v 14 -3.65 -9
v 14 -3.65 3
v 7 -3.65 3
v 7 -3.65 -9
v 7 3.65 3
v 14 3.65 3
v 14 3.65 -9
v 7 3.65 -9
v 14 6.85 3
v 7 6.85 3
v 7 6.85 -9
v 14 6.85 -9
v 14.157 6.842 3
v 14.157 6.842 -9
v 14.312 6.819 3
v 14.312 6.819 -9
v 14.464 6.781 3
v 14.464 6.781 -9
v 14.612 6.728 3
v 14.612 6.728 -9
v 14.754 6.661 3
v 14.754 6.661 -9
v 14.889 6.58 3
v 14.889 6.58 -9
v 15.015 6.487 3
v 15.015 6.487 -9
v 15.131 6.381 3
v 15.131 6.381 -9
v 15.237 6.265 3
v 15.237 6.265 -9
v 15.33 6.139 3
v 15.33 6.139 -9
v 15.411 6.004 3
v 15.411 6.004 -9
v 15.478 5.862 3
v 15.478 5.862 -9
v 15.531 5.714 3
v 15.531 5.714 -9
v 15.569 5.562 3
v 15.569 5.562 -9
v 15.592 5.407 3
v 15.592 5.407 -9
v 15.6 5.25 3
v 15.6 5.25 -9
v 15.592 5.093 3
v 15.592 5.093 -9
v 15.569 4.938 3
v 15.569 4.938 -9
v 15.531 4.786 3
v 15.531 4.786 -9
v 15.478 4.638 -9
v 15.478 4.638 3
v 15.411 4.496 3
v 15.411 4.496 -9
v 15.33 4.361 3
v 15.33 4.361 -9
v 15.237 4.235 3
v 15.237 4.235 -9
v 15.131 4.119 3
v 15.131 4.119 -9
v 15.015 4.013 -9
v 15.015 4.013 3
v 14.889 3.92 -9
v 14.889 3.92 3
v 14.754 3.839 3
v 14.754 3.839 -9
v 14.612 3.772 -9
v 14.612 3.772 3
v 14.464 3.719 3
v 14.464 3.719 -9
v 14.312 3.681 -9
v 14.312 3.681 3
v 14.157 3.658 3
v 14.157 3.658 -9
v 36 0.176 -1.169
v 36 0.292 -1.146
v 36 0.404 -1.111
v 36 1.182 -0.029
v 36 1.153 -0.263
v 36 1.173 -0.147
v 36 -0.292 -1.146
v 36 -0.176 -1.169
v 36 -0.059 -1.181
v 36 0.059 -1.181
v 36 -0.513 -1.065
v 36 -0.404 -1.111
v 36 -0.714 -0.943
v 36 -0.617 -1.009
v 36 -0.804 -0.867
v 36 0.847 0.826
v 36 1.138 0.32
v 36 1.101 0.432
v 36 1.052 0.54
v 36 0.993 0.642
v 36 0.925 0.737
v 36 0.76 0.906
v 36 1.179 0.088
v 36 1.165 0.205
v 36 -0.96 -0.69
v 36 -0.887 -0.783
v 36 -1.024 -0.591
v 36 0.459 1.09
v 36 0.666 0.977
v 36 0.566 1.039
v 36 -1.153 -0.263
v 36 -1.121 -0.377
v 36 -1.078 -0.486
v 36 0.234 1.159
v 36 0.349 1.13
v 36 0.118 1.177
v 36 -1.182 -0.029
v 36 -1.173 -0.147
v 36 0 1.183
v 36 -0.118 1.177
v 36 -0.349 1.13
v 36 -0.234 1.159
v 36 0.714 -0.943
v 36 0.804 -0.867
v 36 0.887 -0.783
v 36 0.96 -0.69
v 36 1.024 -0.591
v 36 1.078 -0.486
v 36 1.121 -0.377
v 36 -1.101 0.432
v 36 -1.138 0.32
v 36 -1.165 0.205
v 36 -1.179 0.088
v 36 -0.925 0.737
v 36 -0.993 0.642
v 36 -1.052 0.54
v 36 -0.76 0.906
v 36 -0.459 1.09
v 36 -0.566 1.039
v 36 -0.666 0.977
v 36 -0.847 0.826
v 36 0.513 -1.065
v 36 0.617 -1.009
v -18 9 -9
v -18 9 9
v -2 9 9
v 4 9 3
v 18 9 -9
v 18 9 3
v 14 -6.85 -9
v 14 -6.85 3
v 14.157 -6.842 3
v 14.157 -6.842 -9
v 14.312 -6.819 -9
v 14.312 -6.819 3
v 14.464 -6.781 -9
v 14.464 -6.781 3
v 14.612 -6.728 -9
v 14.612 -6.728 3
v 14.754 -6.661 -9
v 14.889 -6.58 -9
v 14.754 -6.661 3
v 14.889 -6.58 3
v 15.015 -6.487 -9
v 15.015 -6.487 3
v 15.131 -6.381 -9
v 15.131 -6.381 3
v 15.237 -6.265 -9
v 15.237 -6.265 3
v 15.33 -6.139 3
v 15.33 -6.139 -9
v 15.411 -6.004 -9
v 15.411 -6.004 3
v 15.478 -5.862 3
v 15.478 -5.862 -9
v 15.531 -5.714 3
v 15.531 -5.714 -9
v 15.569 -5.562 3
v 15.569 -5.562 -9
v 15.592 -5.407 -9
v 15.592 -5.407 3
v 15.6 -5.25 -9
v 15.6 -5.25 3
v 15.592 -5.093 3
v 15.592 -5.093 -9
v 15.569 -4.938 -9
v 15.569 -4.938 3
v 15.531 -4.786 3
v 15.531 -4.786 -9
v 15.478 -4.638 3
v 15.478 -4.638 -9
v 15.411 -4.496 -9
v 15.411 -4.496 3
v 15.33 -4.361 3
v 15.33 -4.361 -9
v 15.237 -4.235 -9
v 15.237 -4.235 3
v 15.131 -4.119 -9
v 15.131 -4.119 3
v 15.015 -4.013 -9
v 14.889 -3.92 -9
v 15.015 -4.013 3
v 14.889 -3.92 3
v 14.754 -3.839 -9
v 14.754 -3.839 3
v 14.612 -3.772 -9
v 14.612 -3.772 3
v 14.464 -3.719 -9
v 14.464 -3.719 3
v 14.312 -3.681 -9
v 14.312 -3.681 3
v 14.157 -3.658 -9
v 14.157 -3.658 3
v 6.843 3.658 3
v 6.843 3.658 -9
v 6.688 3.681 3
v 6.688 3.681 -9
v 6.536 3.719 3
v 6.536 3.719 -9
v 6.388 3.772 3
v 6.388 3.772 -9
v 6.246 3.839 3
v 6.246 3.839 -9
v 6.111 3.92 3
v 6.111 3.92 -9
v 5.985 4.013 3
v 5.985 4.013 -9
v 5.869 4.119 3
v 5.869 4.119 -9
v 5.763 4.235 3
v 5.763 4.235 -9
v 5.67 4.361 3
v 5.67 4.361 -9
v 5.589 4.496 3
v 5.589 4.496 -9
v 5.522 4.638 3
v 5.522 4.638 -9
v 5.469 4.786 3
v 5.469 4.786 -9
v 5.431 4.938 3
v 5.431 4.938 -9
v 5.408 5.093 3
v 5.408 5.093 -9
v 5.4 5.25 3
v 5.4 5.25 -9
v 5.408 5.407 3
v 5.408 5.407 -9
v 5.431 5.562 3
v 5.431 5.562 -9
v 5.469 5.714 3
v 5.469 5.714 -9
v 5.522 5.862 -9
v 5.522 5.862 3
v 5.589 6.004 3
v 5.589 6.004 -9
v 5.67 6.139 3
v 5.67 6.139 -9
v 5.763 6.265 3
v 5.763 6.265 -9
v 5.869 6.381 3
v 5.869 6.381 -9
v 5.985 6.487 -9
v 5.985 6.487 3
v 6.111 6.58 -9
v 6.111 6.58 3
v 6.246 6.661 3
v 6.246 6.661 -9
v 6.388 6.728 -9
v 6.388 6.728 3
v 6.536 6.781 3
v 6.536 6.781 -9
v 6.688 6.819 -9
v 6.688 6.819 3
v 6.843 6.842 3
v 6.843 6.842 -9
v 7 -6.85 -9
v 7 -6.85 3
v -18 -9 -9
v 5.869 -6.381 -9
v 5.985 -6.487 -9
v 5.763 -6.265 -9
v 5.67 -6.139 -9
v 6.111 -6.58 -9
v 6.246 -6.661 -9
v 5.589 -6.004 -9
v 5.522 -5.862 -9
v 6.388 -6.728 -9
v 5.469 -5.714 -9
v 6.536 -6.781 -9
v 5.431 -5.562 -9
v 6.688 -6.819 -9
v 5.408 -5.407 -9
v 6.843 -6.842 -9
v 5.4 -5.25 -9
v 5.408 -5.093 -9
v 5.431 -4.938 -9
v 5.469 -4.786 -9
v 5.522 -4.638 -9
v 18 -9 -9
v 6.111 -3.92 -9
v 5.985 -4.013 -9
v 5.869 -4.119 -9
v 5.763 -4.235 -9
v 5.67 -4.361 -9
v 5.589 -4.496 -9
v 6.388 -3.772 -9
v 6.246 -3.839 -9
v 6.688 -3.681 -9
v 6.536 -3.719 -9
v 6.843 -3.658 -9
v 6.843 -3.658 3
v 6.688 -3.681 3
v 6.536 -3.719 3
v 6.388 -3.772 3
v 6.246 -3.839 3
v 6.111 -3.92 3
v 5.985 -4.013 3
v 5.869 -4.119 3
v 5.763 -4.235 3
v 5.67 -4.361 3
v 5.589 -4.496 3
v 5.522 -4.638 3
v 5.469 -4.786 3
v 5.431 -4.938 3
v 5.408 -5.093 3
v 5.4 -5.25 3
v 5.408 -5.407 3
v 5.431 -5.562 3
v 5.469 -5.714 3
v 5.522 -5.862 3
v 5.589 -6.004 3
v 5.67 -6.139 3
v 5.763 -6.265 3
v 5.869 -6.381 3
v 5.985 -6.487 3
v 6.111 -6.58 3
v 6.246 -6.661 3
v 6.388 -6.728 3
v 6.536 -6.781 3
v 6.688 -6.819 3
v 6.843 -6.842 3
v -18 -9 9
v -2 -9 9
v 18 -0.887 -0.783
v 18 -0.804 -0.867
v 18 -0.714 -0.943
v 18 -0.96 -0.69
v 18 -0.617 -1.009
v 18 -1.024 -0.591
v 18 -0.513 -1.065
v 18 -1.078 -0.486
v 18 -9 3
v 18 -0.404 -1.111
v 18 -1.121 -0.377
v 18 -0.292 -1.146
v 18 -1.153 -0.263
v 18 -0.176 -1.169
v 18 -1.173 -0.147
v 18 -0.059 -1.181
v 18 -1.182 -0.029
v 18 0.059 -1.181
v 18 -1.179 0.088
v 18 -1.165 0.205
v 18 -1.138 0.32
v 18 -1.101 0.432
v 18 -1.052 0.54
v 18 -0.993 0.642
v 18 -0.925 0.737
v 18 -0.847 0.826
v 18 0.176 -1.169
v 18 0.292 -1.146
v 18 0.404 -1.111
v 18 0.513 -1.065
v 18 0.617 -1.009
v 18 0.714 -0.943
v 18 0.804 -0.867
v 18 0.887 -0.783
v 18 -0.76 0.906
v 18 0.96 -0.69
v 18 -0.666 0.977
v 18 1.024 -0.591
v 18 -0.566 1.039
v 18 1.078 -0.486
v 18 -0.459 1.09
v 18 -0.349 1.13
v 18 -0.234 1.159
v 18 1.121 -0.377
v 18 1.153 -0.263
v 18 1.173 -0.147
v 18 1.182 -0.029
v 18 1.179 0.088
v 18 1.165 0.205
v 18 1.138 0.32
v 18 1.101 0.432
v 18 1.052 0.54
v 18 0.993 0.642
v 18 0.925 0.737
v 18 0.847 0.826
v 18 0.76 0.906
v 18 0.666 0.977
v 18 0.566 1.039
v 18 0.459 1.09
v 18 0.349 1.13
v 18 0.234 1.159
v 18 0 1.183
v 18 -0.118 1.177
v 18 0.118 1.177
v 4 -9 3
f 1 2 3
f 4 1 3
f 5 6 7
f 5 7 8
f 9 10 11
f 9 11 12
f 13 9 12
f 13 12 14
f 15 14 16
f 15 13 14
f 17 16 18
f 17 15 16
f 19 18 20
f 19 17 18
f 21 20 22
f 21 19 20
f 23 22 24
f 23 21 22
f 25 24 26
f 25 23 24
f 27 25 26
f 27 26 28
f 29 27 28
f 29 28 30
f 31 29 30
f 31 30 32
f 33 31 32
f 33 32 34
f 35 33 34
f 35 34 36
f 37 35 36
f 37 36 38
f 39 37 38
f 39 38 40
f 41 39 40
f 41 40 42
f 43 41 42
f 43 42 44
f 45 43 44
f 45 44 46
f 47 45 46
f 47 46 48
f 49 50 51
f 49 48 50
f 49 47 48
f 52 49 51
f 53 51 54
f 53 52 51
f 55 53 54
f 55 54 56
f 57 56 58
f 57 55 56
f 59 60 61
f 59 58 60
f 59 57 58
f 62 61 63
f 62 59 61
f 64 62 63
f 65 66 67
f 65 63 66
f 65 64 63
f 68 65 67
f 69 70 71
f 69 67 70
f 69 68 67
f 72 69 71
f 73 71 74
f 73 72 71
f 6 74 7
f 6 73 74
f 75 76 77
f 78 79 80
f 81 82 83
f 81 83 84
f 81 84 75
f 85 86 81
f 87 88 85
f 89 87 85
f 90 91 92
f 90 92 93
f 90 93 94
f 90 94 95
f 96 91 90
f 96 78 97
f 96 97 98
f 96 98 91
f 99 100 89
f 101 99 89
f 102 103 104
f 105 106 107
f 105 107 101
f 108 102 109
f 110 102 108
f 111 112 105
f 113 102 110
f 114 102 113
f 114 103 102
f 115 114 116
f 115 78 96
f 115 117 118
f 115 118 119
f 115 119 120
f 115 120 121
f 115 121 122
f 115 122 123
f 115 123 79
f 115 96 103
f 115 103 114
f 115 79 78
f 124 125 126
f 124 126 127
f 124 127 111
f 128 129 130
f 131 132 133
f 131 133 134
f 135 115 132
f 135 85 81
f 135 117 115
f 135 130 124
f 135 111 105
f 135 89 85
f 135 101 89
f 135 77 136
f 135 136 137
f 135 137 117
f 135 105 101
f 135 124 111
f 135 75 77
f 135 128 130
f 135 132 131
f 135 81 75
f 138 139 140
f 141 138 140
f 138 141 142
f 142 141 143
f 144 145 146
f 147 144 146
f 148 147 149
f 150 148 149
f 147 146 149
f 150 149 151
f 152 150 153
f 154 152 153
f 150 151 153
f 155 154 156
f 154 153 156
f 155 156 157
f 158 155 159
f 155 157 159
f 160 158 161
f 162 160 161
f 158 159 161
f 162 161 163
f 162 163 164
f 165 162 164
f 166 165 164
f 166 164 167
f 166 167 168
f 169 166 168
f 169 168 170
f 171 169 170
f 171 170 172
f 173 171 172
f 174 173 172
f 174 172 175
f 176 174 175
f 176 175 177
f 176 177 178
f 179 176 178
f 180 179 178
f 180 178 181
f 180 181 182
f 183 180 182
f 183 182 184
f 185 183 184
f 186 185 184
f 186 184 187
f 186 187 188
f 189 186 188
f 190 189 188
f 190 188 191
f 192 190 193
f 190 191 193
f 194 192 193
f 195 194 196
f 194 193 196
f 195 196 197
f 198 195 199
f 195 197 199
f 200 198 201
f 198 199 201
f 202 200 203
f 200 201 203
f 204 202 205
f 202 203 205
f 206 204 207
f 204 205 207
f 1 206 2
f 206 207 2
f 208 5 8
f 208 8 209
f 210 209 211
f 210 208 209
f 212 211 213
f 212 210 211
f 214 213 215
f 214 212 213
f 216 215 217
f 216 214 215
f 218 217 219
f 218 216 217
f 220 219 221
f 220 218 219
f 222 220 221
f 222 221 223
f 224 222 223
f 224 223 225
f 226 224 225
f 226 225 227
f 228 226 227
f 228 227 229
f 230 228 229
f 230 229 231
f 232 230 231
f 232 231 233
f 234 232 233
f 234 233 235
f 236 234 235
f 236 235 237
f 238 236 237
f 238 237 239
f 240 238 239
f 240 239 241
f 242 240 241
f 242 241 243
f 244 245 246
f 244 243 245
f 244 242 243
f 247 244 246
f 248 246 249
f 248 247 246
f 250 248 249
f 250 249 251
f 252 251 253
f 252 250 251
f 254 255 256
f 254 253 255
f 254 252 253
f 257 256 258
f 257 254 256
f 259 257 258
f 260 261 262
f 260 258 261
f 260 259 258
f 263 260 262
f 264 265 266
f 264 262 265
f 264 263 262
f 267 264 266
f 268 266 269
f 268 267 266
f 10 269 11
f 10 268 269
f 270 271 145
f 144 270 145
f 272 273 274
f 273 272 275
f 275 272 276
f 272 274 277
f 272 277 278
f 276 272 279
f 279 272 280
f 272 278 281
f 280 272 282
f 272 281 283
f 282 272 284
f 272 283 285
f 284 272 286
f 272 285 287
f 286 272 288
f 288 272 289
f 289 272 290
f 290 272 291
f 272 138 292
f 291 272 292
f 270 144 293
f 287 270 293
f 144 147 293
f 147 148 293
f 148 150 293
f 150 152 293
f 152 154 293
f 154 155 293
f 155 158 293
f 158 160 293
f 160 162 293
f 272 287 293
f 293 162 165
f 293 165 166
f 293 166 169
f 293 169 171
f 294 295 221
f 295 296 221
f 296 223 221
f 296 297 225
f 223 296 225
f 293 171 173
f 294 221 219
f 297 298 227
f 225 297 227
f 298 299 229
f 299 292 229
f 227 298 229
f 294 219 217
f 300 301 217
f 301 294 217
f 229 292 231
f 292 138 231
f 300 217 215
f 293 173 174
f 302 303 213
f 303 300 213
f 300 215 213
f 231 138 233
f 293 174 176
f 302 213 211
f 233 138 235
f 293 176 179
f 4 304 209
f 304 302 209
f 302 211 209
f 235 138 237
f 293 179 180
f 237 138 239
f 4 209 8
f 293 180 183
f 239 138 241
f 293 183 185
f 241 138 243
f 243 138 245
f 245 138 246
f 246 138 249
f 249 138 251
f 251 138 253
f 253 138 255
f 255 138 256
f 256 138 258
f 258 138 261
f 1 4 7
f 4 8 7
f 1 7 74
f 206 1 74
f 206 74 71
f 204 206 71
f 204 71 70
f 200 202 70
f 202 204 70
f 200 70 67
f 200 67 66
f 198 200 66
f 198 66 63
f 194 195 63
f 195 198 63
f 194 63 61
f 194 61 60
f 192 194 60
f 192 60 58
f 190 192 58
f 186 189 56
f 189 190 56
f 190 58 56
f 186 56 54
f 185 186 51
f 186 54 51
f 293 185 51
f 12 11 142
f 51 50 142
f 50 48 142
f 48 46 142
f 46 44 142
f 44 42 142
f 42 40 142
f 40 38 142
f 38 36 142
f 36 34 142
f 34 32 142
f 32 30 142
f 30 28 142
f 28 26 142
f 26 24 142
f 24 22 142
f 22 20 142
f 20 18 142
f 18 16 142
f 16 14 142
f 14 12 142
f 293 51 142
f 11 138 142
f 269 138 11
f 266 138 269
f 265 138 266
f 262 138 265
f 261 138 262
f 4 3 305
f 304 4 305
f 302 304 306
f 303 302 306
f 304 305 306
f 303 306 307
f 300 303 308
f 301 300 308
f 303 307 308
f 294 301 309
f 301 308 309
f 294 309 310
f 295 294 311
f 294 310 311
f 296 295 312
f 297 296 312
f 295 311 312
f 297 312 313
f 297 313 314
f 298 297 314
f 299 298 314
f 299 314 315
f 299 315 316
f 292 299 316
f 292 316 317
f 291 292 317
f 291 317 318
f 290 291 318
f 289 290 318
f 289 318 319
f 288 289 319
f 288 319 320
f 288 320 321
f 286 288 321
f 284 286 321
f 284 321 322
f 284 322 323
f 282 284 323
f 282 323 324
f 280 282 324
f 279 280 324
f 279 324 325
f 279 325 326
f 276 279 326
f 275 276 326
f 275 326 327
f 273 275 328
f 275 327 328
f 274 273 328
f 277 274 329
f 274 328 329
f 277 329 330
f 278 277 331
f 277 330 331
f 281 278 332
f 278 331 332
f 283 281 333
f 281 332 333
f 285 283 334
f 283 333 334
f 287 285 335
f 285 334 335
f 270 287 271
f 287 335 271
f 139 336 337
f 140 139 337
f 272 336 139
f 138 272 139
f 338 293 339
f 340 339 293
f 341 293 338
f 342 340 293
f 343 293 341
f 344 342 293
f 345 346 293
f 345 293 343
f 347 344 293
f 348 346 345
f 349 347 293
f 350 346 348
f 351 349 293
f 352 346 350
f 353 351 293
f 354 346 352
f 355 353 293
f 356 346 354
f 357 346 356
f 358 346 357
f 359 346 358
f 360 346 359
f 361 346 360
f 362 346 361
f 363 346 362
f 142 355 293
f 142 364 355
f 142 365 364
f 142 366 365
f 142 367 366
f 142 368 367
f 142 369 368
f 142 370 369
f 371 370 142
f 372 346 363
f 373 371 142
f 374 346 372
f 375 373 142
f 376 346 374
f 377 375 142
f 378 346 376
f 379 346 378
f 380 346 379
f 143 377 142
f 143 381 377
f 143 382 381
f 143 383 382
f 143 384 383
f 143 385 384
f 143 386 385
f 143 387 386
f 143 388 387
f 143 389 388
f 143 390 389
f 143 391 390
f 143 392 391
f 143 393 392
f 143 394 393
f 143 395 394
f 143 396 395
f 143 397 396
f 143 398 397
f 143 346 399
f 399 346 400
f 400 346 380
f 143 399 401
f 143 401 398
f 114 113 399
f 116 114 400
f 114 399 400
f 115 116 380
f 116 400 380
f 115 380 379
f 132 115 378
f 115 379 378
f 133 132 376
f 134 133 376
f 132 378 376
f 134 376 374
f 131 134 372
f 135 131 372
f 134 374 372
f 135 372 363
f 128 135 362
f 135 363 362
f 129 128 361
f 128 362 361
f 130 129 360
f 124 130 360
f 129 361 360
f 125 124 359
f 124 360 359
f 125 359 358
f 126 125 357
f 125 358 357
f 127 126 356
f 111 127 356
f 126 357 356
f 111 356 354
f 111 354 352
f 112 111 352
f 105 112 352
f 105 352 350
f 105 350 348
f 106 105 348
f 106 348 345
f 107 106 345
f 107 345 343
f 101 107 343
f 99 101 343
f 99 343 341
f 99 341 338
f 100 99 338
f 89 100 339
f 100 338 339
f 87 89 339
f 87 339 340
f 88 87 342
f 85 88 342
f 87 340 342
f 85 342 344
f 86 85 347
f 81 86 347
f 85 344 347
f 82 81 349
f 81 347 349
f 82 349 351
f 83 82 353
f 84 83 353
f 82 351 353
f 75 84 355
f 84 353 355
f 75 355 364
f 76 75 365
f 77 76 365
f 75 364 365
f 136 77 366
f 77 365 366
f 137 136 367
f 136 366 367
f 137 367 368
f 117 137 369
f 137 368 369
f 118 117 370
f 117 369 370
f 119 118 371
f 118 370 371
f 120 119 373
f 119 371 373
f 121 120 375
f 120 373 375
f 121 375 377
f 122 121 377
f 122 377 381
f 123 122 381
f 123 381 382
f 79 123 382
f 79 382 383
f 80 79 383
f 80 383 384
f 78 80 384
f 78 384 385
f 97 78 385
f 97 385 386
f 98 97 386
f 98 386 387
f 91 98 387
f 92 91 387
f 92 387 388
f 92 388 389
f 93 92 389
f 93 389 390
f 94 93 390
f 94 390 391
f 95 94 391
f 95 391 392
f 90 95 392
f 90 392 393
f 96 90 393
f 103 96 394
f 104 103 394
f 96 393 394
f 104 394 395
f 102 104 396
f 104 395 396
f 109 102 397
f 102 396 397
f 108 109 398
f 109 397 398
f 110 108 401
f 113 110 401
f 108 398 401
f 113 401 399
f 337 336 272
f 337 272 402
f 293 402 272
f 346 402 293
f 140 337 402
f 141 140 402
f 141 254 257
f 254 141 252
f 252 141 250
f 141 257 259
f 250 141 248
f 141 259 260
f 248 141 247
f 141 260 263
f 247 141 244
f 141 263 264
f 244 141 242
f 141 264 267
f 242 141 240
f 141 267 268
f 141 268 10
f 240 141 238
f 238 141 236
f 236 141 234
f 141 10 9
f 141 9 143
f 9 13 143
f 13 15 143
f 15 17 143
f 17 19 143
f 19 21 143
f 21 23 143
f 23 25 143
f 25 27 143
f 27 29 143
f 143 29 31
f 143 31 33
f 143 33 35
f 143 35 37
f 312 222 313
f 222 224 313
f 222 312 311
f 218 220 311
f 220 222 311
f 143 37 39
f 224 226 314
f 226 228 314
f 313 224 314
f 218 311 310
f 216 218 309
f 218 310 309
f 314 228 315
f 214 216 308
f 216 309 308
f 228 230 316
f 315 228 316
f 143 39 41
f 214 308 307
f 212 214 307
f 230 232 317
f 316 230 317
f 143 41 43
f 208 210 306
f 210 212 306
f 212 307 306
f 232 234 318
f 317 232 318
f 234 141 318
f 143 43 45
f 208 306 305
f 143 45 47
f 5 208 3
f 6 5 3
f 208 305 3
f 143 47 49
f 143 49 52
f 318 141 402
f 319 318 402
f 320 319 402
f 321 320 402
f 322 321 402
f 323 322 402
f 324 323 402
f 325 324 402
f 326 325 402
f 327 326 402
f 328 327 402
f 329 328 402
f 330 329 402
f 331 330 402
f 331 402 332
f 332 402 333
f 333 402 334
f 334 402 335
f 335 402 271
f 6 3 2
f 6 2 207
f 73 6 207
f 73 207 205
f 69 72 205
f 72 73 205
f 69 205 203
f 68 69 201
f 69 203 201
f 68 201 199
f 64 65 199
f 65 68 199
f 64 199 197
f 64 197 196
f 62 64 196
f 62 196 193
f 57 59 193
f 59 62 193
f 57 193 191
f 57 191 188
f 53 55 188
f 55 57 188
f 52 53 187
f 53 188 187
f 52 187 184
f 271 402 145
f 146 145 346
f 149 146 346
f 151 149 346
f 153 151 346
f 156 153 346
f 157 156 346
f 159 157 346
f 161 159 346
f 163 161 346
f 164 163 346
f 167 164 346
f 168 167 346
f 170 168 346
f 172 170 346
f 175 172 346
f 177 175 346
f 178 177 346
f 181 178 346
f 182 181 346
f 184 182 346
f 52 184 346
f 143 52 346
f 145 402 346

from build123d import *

# Parameters (mm, degrees)
SZKIC1_W                    = 36
SZKIC1_H                    = 18
DODANIE_WYCI_GNI_CIE1_DEPTH = 9
WYTNIJ_WYCI_GNI_CIE1_DEPTH  = 18
SZKIC3_R                    = 1.182612818
DODANIE_WYCI_GNI_CIE2_DEPTH = 18
WYTNIJ_WYCI_GNI_CIE2_DEPTH  = 40


with BuildPart() as part:
    # Szkic1 → Dodanie-wyciągnięcie1 (new, symmetric)
    with BuildSketch(Plane.XY):
        Rectangle(SZKIC1_W, SZKIC1_H)
    extrude(amount=DODANIE_WYCI_GNI_CIE1_DEPTH, both=True)

    # Szkic2 → Wytnij-wyciągnięcie1 (cut)
    with BuildSketch(Plane.XZ.offset(9)):
        Polygon((-2, 9), (4, 3), (18, 3), (18, 9), align=None)
    extrude(amount=-WYTNIJ_WYCI_GNI_CIE1_DEPTH, mode=Mode.SUBTRACT)

    # Szkic3 → Dodanie-wyciągnięcie2 (add)
    with BuildSketch(Plane(origin=(18, 0, 0), x_dir=(0, 0, -1), z_dir=(1, 0, 0))):
        with Locations(Location((0, 0, 0), (0, 0, 180))):
            Circle(SZKIC3_R)
    extrude(amount=DODANIE_WYCI_GNI_CIE2_DEPTH)

    # Szkic4 → Wytnij-wyciągnięcie2 (cut, through all)
    with BuildSketch(Plane.XY.offset(3)):
        with BuildLine():
            Line((7, 6.85), (14, 6.85))
            ThreePointArc((14, 6.85), (15.6, 5.25), (14, 3.65))
            Line((14, 3.65), (7, 3.65))
            ThreePointArc((7, 3.65), (5.4, 5.25), (7, 6.85))
        make_face()
        with BuildLine():
            Line((7, -6.85), (14, -6.85))
            ThreePointArc((14, -6.85), (15.6, -5.25), (14, -3.65))
            Line((14, -3.65), (7, -3.65))
            ThreePointArc((7, -3.65), (5.4, -5.25), (7, -6.85))
        make_face()
    extrude(amount=-WYTNIJ_WYCI_GNI_CIE2_DEPTH, mode=Mode.SUBTRACT)


solid = part.part
